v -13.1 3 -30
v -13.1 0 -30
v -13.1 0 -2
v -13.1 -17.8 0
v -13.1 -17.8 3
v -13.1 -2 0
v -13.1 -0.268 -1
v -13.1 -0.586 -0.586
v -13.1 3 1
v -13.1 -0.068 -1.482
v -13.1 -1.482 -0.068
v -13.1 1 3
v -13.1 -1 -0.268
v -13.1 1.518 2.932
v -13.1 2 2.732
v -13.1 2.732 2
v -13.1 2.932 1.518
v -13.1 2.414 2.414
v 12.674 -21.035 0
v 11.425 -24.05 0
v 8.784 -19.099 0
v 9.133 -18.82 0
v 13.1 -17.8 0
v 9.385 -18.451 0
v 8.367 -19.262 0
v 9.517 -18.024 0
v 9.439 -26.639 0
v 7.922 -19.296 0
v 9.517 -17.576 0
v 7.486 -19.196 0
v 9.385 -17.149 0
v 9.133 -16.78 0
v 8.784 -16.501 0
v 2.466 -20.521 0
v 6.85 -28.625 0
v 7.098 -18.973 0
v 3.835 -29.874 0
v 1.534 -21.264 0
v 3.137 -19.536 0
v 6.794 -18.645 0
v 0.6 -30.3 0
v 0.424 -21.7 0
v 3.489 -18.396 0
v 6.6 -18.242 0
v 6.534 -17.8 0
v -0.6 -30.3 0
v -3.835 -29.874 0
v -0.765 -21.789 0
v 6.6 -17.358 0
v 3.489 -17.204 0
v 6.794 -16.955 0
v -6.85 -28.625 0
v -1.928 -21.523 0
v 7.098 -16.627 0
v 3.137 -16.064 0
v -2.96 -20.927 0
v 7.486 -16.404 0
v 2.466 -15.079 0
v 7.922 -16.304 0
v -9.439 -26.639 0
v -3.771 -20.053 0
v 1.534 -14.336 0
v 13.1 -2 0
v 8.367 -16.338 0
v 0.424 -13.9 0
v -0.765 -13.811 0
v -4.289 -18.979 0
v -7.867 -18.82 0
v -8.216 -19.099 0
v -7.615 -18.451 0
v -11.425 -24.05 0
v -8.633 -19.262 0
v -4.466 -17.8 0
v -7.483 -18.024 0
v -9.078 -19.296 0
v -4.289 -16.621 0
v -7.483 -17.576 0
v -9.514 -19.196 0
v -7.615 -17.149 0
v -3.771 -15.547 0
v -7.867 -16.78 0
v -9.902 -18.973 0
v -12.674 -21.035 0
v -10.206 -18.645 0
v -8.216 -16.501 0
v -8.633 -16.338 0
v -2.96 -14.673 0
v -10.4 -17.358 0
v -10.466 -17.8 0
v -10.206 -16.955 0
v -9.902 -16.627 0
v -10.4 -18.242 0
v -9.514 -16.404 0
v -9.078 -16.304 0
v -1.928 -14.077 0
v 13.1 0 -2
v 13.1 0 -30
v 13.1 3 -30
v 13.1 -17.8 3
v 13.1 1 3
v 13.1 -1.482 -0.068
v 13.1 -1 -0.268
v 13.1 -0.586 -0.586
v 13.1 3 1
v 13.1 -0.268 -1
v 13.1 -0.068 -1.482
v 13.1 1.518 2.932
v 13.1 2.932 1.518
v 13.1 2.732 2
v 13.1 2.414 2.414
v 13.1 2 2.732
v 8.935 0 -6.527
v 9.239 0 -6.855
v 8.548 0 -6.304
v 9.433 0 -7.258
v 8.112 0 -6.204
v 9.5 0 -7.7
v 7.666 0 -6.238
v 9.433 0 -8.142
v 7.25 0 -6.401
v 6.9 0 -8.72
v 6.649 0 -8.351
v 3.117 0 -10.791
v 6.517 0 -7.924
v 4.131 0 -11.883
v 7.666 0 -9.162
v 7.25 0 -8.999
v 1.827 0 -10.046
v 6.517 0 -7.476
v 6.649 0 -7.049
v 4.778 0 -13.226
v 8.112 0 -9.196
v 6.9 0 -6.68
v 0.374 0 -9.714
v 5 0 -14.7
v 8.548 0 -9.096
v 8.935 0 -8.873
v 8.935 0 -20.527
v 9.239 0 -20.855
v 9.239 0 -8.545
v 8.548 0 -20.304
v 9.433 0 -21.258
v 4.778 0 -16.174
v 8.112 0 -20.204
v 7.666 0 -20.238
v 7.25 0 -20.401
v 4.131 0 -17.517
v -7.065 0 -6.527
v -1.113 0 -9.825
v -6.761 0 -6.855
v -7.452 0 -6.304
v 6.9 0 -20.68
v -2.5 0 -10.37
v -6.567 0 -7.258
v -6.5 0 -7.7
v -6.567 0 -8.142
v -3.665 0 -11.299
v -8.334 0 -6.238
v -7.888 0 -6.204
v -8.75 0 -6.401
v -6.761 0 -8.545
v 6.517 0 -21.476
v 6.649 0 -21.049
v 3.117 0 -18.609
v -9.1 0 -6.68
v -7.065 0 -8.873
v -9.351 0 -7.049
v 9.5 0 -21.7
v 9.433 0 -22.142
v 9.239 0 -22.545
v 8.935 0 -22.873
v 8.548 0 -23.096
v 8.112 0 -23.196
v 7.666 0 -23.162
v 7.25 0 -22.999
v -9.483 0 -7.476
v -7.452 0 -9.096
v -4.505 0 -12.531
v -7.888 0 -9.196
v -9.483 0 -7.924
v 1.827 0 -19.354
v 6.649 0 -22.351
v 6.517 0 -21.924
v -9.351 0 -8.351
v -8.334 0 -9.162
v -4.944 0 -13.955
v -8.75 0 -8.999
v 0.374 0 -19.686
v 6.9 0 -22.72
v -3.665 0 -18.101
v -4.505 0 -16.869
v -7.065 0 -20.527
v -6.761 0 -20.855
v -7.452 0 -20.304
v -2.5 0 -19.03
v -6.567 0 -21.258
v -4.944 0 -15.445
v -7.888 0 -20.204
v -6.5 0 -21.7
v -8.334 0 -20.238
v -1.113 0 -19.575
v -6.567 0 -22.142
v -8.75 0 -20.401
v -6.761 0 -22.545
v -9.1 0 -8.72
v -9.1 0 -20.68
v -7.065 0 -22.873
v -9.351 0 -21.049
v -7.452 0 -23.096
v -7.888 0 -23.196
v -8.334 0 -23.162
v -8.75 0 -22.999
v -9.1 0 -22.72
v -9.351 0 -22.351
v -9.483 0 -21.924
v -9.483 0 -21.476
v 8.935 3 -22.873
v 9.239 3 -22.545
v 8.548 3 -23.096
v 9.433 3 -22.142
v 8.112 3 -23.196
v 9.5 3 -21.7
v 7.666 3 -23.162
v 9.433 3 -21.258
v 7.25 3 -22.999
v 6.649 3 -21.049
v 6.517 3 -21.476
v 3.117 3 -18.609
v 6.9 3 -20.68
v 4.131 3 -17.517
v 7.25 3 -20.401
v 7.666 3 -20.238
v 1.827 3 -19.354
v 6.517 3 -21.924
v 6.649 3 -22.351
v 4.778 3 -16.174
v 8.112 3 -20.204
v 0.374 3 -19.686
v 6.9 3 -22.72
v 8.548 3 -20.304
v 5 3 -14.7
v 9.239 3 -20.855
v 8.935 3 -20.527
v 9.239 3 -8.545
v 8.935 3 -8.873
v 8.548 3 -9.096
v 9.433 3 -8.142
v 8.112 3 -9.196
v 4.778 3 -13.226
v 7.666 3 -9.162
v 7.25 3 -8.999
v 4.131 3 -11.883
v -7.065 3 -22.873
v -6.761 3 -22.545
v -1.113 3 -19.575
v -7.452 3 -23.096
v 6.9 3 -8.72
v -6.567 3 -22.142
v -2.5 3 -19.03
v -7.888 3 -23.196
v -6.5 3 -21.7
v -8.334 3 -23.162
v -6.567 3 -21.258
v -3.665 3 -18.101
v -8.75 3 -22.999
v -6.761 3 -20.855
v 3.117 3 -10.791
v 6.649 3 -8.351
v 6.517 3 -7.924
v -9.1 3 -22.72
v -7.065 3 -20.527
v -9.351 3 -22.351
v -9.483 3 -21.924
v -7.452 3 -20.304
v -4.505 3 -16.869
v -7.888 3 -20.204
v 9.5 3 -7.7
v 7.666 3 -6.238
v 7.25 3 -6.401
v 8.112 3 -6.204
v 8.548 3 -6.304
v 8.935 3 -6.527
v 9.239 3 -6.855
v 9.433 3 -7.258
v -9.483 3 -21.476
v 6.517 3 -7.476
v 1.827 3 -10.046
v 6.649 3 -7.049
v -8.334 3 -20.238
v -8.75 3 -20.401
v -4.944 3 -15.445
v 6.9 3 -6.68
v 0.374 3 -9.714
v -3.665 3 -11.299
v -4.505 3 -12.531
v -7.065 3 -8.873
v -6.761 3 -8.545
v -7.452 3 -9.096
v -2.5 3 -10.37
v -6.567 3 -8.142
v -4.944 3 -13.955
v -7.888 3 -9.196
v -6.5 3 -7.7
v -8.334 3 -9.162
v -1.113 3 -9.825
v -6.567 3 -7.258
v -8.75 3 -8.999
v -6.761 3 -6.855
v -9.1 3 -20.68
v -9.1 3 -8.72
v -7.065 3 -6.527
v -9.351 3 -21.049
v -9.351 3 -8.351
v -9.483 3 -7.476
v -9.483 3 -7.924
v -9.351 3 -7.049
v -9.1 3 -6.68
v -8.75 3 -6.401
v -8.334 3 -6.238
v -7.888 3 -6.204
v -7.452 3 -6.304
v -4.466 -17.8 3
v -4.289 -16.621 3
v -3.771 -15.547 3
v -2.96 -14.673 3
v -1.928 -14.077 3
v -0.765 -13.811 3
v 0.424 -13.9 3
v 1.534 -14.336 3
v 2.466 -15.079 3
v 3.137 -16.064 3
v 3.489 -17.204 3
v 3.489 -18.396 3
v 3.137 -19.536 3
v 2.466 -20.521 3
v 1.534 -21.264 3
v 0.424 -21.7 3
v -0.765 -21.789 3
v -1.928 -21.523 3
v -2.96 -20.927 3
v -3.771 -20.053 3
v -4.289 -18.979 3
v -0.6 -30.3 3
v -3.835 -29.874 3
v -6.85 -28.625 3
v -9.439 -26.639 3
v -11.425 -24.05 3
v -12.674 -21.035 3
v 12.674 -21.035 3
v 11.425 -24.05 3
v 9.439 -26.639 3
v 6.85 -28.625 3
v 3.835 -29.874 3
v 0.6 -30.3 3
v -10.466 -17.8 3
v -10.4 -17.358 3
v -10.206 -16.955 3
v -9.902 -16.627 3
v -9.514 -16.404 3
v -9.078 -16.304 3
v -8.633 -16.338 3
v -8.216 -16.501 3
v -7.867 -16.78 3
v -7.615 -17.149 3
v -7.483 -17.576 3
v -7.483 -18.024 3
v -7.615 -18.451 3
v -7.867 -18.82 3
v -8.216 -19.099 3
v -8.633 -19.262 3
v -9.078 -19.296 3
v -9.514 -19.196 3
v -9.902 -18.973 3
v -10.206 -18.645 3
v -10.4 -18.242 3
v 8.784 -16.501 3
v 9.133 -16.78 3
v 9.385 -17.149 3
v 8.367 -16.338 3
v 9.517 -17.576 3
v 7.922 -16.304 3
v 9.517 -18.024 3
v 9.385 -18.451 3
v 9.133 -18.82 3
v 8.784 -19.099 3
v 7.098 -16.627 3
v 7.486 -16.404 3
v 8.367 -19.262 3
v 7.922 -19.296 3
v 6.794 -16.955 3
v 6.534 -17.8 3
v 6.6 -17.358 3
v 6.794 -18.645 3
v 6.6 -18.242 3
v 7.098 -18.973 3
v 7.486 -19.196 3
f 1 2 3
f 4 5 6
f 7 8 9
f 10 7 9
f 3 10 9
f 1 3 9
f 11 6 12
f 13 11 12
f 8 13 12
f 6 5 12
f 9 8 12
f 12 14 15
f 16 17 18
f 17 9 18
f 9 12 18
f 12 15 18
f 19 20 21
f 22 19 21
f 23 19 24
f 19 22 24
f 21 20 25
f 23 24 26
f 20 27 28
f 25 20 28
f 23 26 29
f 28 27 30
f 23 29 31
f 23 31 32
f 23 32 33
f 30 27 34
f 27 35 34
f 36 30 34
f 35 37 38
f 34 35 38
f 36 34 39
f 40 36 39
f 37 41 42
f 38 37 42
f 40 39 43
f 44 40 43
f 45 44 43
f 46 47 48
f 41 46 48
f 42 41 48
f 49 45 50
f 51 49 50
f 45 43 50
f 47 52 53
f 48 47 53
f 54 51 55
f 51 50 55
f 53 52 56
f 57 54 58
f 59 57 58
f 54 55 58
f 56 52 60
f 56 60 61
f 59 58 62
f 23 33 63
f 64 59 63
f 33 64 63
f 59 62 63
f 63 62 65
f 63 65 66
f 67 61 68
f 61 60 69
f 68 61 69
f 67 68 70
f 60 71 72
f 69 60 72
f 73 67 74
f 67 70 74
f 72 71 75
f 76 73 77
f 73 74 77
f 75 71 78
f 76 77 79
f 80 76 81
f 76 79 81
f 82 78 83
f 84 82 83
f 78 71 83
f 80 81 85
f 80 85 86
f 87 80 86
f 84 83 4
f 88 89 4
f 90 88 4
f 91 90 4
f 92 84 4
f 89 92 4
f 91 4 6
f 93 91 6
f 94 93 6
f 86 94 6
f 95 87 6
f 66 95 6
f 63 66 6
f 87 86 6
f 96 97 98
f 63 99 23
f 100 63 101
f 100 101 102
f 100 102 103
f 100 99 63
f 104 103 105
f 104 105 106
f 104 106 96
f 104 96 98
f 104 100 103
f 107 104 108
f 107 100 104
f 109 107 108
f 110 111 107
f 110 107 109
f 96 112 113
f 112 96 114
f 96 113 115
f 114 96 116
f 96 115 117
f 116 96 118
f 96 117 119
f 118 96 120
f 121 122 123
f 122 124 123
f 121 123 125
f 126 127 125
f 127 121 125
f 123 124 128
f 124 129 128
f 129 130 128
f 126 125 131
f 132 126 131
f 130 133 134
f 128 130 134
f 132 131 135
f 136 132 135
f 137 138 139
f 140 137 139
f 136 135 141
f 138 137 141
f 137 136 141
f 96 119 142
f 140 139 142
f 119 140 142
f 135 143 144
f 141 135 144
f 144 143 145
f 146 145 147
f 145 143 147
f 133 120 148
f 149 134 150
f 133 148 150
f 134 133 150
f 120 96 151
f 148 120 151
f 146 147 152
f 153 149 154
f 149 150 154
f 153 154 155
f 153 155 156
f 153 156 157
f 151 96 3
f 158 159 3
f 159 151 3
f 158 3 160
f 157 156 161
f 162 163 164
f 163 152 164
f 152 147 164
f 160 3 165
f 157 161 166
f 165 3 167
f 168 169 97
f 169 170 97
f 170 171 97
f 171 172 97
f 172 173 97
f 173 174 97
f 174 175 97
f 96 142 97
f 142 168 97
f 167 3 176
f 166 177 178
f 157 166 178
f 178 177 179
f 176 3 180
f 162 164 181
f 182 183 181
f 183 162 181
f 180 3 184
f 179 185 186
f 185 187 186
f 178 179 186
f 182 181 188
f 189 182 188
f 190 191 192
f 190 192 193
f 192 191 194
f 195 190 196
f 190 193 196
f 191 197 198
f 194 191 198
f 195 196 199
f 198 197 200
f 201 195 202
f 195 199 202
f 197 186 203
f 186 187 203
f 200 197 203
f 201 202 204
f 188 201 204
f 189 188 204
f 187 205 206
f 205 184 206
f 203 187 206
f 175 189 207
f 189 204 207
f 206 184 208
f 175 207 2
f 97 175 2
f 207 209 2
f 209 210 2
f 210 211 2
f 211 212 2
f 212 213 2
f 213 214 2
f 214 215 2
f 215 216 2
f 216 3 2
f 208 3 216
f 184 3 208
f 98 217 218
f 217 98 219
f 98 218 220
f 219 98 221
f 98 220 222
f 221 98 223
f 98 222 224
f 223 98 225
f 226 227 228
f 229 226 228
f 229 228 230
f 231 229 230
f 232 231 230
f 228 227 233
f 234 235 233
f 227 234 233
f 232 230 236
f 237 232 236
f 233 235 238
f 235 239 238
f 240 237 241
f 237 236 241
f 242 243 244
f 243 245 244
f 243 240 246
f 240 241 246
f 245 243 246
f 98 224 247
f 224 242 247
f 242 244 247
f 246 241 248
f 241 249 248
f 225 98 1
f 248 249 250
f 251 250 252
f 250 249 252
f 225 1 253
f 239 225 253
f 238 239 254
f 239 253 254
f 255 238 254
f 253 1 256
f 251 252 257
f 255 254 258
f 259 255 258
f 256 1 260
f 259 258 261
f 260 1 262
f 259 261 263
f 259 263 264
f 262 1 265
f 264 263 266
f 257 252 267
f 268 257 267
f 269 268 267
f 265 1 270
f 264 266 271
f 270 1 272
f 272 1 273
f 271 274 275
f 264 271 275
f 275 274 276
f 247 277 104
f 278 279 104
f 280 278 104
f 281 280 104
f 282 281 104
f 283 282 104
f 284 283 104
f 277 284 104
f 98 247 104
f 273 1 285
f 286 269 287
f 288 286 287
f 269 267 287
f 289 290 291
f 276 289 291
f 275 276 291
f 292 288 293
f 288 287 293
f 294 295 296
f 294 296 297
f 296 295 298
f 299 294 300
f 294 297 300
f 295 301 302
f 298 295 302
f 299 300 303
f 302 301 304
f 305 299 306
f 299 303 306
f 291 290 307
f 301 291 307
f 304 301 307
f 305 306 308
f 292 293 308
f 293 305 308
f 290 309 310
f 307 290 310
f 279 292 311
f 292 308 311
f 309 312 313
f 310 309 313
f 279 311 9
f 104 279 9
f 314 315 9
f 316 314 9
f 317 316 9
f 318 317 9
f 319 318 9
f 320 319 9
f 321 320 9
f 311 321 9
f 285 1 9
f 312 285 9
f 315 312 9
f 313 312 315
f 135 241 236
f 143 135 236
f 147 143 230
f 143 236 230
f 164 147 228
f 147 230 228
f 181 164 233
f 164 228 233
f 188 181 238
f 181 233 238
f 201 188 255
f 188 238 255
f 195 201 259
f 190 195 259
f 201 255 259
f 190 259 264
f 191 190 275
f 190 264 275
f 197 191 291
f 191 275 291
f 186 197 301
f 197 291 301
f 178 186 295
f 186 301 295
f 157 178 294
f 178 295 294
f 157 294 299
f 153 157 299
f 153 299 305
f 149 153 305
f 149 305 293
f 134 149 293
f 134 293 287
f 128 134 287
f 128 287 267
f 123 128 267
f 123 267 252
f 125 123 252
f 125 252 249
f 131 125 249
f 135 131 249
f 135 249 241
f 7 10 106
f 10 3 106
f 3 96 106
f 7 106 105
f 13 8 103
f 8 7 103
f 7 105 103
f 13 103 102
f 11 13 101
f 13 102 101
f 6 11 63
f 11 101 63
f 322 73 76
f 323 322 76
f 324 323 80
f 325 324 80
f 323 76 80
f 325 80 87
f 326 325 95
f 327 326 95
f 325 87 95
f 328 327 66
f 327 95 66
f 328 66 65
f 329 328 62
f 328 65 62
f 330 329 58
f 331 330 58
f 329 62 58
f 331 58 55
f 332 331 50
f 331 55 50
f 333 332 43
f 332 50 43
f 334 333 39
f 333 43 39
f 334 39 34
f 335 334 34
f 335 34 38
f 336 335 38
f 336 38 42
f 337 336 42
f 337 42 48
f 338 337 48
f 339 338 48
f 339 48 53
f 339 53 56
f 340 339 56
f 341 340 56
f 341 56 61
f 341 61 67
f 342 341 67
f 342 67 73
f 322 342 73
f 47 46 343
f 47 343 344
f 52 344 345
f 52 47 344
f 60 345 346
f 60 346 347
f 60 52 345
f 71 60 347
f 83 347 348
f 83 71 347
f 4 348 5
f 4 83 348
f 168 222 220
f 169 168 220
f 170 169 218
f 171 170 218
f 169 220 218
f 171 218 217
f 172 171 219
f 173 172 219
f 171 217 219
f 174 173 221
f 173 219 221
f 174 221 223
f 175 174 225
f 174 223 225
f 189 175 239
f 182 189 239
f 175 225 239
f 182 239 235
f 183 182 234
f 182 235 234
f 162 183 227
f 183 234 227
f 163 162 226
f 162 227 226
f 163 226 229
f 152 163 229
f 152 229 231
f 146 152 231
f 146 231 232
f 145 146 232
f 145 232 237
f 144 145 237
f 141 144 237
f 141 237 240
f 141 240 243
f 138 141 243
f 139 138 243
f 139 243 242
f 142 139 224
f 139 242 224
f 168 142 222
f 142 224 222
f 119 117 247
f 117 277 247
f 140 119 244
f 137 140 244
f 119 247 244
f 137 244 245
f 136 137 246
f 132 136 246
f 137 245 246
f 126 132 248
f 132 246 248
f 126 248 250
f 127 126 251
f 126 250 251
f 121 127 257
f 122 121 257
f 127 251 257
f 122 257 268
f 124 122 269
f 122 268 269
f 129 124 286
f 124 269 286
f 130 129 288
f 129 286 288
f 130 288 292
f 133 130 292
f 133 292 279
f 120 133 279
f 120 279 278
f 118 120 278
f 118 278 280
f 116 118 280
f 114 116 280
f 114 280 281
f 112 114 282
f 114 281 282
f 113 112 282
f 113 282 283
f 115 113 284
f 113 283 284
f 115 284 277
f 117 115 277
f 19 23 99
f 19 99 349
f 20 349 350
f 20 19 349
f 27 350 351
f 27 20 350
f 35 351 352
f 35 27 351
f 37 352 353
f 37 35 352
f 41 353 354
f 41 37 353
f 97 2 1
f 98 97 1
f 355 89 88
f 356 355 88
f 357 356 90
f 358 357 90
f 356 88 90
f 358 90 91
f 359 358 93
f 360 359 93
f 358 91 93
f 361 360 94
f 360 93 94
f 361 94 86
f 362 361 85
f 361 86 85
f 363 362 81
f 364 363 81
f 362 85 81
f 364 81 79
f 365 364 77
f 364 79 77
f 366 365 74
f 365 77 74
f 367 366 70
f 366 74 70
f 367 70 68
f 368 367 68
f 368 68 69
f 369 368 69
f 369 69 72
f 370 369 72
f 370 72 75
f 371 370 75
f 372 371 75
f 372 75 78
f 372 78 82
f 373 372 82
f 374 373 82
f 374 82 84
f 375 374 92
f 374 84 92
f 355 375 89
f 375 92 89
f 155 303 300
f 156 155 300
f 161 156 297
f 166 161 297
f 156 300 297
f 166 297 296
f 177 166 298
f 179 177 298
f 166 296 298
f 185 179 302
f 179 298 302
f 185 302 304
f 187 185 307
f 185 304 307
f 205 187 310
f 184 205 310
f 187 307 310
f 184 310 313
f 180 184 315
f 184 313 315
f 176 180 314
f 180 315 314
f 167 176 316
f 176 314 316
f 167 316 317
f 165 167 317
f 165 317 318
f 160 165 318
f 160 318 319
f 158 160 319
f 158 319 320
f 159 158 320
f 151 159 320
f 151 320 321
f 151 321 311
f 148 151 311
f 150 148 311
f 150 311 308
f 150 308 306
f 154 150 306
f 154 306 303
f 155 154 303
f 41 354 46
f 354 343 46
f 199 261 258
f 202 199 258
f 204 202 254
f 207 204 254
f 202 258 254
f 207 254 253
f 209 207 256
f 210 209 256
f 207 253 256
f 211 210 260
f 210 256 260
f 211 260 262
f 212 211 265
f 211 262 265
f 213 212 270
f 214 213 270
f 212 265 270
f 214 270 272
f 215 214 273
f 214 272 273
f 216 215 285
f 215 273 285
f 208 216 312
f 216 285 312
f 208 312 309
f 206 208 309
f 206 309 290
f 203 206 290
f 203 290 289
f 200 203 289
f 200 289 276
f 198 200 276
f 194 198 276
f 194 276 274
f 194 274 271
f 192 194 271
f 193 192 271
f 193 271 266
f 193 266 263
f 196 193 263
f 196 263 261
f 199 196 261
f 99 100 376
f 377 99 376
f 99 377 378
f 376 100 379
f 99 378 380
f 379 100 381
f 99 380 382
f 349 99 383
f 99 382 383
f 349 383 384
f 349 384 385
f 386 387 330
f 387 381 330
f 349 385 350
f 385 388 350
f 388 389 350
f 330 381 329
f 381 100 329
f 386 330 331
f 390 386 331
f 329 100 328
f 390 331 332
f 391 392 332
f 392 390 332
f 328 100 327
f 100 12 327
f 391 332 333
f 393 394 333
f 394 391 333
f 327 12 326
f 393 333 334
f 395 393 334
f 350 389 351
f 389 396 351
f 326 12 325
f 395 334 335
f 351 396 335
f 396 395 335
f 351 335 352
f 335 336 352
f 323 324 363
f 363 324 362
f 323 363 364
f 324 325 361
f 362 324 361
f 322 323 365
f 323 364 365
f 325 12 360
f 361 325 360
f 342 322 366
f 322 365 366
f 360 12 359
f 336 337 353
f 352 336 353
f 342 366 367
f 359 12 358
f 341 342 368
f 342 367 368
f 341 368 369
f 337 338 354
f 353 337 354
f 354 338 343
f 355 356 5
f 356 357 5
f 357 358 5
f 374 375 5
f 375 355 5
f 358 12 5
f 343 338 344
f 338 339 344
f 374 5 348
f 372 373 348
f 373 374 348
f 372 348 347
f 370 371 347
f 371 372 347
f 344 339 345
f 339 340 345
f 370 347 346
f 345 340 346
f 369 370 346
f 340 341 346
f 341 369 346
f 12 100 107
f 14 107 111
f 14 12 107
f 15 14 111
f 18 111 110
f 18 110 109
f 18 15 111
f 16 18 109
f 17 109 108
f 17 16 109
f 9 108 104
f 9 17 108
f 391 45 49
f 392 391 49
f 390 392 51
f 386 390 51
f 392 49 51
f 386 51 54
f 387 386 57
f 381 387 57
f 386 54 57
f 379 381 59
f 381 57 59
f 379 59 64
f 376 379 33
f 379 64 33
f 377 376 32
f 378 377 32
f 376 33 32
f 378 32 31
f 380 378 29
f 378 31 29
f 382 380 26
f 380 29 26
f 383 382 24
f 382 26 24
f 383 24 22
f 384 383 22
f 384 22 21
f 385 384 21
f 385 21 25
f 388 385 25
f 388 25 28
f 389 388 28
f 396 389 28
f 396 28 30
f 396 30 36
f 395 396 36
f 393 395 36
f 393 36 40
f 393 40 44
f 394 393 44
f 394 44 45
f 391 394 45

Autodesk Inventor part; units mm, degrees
ref_plane "YZ Plane" through (0, 0, 0) normal (1, 0, 0) x (0, 1, 0)
ref_plane "XZ Plane" through (0, 0, 0) normal (0, 1, 0) x (-1, 0, 0)
sketch "Sketch1" plane through (0, 0, 0) normal (1, 0, 0) x (0, 1, 0)
  line L0 (-30.3, 0) -> (0, 0)
  line L1 (0, 0) -> (0, -30)
  line L2 (0, -30) -> (3, -30)
  line L3 (3, -30) -> (3, 3)
  line L4 (3, 3) -> (-30.3, 3)
  line L5 (-30.3, 3) -> (-30.3, 0)
  dimension "d0" = 3
  dimension "d1" = 3
  dimension "d35" = 33.3
  dimension "d36" = 33
extrude "Extrusion1" add sketch "Sketch1" along normal mid plane 26.2
fillet "Fillet2" radius 12.5 2 edges at (-13.1, -30.3, 1.5) (13.1, -30.3, 1.5)
ref_plane "Work Plane1" through (13.1, -2, 0) normal (0, 0, -1) x (-1, 0, 0)
sketch "Sketch2" plane through (13.1, -2, 0) normal (0, 0, -1) x (-1, 0, 0)
  circle A0 centre (22.0664, -15.8) radius 1.5
  circle A1 centre (5.0664, -15.8) radius 1.5
  line L0 (22.0664, -15.8) -> (5.0664, -15.8) construction
  line L1 (5.0664, -15.8) -> (0.9327, -15.8) construction
  circle A2 centre (13.5664, -15.8) radius 4
  line L2 (26.2, 2) -> (26.2, -15.8) projected
  line L3 (26.2, -15.8) -> (22.0664, -15.8) construction
  point P0 (13.1, 2)
  dimension "d8" = 3
  dimension "d9" = 3
  dimension "d10" = 17
  dimension "d11" = 8
extrude "Extrusion2" cut sketch "Sketch2" against normal through all
sketch "Sketch6" plane through (-13.1, 3, 3) normal (0, 1, 0) x (1, 0, 0)
  line L0 (26.2, 0) -> (0, 0) projected
  line L1 (26.2, 33) -> (0, 33) projected
  line L2 (13.1, 33) -> (13.1, 0) construction
  circle A0 centre (13.1, 17.7) radius 5
  line L3 (5.1, 24.7) -> (21.1, 24.7) construction
  line L4 (21.1, 24.7) -> (21.1, 10.7) construction
  line L5 (21.1, 10.7) -> (5.1, 10.7) construction
  line L6 (5.1, 10.7) -> (5.1, 24.7) construction
  line L7 (5.1, 24.7) -> (21.1, 10.7) construction
  line L8 (21.1, 24.7) -> (5.1, 10.7) construction
  circle A1 centre (21.1, 10.7) radius 1.5
  circle A2 centre (5.1, 10.7) radius 1.5
  circle A3 centre (5.1, 24.7) radius 1.5
  circle A4 centre (21.1, 24.7) radius 1.5
  point P0 (13.1, 3)
  dimension "d39" = 10
  dimension "d40" = 17.7
  dimension "d41" = 16
  dimension "d42" = 14
  dimension "d43" = 3
  dimension "d44" = 3
  dimension "d45" = 3
  dimension "d46" = 3
extrude "Extrusion4" cut sketch "Sketch6" against normal up to next
fillet "Fillet3" radius 2 2 edges at (0, 3, 3) (0, 0, 0)
equation "\"d1\" = d0"
properties part number "soporte motor"
